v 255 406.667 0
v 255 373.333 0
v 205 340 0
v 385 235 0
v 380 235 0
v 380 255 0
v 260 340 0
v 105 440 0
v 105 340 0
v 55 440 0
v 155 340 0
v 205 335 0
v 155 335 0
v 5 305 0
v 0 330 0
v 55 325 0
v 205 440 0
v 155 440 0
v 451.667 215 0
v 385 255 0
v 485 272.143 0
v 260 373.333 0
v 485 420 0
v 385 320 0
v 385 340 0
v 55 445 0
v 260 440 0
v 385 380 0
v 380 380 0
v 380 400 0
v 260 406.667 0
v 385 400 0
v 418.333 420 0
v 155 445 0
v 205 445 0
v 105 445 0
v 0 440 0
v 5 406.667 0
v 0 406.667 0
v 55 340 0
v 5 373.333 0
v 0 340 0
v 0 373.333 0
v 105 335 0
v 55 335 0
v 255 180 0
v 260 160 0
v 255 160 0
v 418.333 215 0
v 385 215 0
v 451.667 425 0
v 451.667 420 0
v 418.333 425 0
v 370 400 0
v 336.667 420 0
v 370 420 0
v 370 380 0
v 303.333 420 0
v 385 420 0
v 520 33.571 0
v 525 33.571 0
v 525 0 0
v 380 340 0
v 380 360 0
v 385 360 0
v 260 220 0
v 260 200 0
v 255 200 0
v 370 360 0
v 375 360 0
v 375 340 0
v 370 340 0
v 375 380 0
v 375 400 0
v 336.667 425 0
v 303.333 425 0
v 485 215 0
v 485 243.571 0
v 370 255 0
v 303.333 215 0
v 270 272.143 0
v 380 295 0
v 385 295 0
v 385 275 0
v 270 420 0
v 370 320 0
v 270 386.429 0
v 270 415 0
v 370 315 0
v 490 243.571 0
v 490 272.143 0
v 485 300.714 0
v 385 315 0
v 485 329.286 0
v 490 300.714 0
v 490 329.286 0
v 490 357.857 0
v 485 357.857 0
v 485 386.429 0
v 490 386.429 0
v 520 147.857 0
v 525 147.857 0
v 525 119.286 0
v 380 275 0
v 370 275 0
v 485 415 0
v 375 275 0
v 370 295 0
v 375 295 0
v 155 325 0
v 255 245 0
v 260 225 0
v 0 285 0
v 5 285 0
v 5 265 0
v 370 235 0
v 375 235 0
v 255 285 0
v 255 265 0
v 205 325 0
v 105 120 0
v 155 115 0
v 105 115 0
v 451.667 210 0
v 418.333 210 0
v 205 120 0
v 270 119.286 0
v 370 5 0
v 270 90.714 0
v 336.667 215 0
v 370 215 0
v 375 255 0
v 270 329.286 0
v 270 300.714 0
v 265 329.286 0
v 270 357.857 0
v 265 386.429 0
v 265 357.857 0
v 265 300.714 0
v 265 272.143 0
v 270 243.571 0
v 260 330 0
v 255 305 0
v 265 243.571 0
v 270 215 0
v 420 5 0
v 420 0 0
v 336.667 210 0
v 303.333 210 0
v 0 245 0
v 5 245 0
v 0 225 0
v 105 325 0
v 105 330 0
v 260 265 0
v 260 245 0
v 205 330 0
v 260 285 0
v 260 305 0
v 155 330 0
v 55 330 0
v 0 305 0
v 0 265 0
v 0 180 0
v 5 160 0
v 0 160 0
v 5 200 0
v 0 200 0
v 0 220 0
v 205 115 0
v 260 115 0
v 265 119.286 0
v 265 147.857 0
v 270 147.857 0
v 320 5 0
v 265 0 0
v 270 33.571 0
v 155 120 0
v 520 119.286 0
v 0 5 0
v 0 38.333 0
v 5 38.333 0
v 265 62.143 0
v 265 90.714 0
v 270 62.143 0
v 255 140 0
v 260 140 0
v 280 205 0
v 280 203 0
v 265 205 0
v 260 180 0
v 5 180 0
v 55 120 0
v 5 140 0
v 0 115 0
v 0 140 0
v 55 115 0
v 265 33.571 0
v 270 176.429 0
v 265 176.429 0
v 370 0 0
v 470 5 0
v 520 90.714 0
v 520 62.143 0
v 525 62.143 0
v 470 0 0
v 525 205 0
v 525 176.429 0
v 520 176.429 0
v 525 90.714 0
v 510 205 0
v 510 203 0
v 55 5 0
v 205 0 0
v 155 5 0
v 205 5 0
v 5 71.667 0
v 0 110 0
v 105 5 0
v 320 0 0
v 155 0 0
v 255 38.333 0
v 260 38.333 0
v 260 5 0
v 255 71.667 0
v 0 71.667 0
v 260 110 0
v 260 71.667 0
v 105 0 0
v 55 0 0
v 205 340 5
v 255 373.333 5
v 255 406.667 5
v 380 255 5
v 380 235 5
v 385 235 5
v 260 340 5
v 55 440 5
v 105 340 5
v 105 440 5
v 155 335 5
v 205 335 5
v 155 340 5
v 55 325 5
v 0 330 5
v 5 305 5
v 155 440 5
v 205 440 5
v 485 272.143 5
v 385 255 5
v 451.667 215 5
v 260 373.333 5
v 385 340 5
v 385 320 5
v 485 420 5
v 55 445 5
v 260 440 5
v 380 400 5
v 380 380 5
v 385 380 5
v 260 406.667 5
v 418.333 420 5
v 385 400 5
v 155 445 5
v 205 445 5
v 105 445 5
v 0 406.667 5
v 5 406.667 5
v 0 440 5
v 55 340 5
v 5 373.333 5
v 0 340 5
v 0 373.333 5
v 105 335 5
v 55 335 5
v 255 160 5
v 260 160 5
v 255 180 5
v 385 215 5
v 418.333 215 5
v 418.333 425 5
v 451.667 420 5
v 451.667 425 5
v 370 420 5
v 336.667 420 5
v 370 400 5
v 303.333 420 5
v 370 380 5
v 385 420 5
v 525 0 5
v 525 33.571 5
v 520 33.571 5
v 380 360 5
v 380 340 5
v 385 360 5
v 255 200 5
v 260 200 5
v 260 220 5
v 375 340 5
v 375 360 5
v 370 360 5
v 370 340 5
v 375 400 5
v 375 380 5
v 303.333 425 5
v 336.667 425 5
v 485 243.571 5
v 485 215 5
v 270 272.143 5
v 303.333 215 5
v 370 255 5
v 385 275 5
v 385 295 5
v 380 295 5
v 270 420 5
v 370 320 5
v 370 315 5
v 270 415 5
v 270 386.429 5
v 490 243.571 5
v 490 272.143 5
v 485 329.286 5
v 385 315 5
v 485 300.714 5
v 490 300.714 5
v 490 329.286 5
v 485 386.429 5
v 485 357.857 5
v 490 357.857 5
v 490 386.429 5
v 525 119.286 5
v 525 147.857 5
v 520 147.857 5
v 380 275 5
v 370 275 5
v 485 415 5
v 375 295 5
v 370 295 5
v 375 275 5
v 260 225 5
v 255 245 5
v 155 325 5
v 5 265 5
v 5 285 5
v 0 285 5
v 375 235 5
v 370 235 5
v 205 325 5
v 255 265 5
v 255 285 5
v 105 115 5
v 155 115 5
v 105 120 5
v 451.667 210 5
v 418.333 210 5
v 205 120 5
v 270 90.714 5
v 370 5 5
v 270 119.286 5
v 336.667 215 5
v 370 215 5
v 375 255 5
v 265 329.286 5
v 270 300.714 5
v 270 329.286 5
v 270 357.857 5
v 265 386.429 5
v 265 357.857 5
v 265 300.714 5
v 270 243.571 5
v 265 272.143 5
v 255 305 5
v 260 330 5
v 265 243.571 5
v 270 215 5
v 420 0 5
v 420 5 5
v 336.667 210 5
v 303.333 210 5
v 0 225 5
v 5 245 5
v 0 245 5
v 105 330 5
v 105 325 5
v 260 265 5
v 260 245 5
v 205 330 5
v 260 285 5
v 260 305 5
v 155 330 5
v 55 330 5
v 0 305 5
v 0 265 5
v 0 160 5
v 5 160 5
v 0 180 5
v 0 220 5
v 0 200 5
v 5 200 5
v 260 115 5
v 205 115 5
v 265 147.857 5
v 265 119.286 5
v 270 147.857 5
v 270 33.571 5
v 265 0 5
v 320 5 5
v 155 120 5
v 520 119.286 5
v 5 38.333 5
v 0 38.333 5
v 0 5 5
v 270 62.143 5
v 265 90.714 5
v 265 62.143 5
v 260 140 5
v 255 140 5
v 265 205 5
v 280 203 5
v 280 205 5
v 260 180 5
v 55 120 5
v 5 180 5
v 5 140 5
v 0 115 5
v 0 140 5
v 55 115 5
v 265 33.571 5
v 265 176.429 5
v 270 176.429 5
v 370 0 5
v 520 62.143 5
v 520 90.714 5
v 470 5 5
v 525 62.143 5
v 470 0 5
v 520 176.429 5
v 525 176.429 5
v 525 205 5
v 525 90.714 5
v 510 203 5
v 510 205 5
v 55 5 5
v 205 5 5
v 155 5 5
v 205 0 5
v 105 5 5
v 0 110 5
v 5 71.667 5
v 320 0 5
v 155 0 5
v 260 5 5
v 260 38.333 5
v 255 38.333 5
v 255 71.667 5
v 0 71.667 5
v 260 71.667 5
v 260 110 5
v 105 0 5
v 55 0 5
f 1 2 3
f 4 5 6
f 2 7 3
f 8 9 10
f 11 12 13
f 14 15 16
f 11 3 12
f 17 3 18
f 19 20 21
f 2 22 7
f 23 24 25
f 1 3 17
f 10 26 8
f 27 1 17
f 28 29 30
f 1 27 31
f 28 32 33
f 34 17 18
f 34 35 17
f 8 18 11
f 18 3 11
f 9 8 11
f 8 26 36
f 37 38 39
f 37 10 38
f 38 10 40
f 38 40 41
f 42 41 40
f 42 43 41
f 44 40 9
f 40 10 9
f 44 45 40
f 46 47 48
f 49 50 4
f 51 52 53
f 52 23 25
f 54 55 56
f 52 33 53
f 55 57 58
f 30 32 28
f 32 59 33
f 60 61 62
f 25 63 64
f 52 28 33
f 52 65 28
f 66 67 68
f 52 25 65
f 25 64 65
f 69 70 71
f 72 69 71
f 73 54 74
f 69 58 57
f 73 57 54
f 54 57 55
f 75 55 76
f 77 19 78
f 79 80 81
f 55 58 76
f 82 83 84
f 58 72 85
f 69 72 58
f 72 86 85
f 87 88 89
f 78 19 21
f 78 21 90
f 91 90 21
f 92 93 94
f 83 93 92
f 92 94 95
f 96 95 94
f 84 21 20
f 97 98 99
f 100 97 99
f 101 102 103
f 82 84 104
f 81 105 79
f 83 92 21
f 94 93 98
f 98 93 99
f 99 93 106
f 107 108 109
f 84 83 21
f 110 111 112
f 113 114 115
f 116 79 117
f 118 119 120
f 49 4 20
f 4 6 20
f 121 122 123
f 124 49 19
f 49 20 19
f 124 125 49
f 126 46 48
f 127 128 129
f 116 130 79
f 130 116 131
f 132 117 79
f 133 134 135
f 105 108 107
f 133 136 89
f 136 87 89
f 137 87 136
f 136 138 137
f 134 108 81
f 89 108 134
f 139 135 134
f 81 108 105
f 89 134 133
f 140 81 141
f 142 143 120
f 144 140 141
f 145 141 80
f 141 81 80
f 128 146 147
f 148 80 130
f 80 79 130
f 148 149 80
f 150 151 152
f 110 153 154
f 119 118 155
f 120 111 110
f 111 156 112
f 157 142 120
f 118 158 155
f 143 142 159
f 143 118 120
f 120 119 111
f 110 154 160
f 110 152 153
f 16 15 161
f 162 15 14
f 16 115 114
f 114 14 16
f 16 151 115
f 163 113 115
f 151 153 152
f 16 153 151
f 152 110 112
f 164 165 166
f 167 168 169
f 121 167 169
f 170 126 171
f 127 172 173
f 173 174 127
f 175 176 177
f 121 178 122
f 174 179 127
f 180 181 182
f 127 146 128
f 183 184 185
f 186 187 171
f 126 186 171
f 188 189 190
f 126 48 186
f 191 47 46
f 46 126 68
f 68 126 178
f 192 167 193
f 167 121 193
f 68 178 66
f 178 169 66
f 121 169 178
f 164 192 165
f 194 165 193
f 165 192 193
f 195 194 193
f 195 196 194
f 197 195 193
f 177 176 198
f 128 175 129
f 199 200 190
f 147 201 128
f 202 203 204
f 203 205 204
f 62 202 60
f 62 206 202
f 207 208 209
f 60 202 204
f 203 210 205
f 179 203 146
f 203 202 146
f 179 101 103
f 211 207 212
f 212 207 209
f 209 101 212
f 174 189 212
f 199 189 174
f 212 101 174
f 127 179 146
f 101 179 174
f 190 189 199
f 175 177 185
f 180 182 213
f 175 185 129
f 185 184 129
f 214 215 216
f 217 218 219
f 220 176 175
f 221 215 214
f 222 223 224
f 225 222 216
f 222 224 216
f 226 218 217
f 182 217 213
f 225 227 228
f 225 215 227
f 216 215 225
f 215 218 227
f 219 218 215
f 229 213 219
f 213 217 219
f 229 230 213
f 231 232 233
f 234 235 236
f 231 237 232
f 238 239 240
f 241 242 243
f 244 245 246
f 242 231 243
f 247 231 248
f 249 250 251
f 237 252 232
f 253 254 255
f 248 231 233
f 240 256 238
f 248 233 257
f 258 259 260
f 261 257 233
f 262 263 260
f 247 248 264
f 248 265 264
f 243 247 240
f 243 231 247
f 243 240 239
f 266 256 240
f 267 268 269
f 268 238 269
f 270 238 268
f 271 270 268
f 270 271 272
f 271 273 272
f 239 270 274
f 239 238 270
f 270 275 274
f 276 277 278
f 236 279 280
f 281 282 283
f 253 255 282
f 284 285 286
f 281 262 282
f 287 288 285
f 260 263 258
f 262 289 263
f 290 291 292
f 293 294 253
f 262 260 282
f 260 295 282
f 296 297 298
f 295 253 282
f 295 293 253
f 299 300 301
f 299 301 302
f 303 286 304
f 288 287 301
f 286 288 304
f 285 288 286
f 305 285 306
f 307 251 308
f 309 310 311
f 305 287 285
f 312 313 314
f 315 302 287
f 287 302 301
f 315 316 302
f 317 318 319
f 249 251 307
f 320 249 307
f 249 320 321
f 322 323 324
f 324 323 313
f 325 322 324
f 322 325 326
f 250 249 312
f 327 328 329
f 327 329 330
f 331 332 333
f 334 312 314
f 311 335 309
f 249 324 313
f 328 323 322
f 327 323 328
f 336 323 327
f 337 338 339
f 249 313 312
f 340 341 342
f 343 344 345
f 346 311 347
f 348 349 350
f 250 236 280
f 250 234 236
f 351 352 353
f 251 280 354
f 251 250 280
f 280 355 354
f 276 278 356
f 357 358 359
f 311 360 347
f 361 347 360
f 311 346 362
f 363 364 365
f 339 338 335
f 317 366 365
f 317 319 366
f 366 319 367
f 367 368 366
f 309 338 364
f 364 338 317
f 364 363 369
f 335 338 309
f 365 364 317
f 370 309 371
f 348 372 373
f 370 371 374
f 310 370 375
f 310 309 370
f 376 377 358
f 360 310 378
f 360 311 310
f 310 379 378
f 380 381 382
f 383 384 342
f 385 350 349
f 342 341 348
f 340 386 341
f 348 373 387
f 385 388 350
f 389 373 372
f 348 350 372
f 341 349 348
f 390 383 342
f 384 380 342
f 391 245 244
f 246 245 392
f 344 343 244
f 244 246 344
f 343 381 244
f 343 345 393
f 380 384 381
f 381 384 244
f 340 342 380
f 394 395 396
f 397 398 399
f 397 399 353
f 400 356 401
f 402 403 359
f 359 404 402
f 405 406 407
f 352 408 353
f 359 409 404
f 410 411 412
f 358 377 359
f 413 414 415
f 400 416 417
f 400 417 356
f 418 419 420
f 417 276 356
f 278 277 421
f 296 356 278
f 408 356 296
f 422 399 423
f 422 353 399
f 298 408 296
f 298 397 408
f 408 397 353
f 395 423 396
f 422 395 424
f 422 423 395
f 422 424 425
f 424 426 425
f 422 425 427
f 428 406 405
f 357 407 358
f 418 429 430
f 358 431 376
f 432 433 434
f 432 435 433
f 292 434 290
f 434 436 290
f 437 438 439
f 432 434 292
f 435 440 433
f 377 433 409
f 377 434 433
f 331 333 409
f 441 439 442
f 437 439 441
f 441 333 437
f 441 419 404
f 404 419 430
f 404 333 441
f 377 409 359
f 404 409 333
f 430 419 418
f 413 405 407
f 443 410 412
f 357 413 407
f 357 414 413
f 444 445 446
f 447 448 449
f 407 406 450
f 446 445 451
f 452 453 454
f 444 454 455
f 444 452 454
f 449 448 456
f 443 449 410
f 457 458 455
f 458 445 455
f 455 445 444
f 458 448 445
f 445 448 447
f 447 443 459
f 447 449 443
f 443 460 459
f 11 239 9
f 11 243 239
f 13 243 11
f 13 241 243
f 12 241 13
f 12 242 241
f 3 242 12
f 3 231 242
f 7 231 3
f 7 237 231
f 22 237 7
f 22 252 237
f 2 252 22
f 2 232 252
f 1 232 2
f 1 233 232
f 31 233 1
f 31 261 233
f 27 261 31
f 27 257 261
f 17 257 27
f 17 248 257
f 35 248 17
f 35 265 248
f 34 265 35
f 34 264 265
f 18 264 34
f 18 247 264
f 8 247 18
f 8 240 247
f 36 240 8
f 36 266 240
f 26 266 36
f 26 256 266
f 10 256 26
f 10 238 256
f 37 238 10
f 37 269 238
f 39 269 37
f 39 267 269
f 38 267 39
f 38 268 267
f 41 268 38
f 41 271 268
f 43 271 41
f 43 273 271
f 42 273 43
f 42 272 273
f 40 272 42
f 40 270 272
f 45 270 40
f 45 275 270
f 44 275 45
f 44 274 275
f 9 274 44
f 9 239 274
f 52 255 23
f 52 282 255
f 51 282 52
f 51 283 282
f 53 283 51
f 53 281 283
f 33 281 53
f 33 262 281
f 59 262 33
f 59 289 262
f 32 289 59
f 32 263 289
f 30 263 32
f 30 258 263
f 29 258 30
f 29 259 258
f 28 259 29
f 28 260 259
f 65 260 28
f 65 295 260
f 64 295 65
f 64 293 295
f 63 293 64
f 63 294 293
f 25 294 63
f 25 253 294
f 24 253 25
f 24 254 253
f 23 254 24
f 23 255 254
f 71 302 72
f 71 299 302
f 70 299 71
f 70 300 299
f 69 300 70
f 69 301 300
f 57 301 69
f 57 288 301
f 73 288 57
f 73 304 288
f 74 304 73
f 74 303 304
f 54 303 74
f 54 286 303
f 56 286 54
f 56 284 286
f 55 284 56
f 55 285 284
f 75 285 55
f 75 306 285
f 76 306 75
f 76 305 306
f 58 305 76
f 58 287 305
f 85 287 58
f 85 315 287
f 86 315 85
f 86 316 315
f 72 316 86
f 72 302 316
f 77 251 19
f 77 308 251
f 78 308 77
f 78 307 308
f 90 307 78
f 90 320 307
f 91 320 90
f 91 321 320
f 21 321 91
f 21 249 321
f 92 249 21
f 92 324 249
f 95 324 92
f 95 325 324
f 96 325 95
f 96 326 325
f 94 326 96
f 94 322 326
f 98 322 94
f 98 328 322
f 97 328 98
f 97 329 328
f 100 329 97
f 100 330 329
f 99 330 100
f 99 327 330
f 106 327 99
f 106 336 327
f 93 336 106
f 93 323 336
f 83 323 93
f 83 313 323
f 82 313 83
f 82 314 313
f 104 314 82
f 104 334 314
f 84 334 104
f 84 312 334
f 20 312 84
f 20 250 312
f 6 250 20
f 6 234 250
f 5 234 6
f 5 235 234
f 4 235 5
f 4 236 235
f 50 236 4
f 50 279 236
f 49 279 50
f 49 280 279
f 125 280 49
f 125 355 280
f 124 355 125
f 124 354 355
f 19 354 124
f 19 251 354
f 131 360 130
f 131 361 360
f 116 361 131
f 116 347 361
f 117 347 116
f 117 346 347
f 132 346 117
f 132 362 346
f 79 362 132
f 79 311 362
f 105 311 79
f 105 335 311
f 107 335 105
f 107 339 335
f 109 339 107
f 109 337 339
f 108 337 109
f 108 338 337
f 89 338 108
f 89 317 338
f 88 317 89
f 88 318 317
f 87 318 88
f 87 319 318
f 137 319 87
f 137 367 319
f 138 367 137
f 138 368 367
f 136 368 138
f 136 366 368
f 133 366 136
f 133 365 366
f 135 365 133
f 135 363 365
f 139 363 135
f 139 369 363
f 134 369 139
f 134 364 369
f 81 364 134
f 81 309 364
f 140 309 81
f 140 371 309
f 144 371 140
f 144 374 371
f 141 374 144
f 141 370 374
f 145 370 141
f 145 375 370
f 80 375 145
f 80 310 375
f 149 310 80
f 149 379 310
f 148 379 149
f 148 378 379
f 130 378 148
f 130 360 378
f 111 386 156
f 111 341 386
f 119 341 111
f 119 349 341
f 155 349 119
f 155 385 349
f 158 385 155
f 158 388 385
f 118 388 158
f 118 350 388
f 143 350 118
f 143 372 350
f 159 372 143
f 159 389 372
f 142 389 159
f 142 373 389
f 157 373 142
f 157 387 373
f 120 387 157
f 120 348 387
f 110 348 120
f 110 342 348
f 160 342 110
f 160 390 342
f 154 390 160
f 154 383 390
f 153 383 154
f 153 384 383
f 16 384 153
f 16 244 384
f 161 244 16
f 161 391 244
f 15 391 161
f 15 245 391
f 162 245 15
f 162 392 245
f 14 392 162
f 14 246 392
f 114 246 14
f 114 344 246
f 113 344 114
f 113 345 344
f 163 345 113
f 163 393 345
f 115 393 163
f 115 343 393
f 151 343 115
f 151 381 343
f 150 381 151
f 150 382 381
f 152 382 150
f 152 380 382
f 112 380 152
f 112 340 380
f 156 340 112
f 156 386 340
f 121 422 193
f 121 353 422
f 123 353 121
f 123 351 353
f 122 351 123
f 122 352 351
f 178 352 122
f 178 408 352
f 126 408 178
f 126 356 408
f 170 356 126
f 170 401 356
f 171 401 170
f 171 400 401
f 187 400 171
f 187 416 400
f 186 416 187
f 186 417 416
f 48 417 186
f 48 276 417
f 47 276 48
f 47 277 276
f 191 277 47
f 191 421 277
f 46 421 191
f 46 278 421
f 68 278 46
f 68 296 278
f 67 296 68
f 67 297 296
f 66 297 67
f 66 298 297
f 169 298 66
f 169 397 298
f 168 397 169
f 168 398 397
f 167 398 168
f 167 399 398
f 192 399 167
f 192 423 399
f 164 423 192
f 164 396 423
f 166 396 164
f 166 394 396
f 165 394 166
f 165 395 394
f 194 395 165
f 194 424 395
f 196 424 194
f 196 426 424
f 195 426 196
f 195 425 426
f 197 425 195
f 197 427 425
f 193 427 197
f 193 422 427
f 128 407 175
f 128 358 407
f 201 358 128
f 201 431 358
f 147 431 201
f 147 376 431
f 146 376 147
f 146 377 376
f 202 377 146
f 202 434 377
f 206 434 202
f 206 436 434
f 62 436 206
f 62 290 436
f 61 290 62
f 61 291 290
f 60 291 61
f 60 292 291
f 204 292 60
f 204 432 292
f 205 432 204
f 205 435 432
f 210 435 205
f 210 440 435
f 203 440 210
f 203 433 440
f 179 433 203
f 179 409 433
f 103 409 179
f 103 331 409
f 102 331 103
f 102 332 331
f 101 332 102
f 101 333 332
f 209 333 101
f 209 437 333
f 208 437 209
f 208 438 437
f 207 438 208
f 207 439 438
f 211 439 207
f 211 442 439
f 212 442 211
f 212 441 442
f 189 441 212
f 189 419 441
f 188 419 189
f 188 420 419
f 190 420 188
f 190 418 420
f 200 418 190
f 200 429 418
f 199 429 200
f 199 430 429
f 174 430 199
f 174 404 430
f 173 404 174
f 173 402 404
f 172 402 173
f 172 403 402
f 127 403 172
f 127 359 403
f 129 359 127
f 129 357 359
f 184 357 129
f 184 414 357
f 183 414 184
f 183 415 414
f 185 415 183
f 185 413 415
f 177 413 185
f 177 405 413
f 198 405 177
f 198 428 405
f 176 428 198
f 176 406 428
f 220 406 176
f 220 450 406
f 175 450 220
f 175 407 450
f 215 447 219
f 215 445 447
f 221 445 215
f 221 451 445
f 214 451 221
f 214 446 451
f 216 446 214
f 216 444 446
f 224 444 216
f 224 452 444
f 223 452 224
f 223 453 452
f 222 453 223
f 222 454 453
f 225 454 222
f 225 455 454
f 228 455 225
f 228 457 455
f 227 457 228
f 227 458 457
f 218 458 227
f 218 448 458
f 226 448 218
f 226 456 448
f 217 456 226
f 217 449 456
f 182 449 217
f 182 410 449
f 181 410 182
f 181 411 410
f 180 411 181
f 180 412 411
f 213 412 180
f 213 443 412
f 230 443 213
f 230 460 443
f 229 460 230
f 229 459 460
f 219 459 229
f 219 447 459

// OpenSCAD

//Customizable Box 
//By Iron Momo


/* [Basic] */
box_width = 250;
box_height = 200;
box_depth = 100;
material_thickness = 5; //[3,5,10]

output_type = "STL"; //[DXF,STL]

/* [Advanced] */
spacing = 5; //[1,5,10]
ratio = 0.5; //[0.25,0.5]


/* [Hidden] */
h2 = box_height*ratio; //Height of the upper part
h1 = box_height*(1-ratio); //Height of the lower part

// preview[view: north, tilt:top]


if(output_type=="STL")
{linear_extrude(height = material_thickness, center = false) box_creation();
}

if(output_type=="DXF")
{box_creation();}



/*--------------*/
/* BOX CREATION */
/*--------------*/
module box_creation()
{
	top();
	translate([0,spacing+box_depth+2*material_thickness]) front_1();
	translate([0,2*spacing+box_depth+h1+3*material_thickness]) front_2();
	translate([0,3*spacing+4*material_thickness+box_depth+h1+h2,0]) bottom();
	translate([box_width+2*material_thickness+spacing,0,0])rear();
	translate([box_width+2*material_thickness+spacing,material_thickness+box_height+spacing,0]) sides();
}

/*----------------*/
/* Top of the box */
/*----------------*/
module top()
{

//Basic shape
translate([material_thickness,material_thickness,0]) square([box_width,box_depth]); 

//Notches
translate([0,material_thickness+box_depth,0]) square([box_width+2*material_thickness,material_thickness]);

translate([0,material_thickness,0]) square([material_thickness,box_depth/3]);
translate([0,material_thickness+2*box_depth/3,0]) square([material_thickness,box_depth/3]);

translate([material_thickness+box_width,material_thickness,0]) square([material_thickness,box_depth/3]);
translate([material_thickness+box_width,material_thickness+2*box_depth/3,0]) square([material_thickness,box_depth/3]);

translate([material_thickness+box_width/5,0,0]) square([box_width/5,material_thickness]);
translate([material_thickness+3*box_width/5,0,0]) square([box_width/5,material_thickness]);


}


/*--------------------*/
/* 2 sides of the box */
/*--------------------*/
module sides()
{
//1st side, upper and lower part
side_1();
translate ([material_thickness,h1+spacing+material_thickness,0]) side_2();

//2nd side is just a mirrored one
translate([2*box_depth+4*material_thickness+spacing,0,0])
{
	mirror ([1,0,0])
		{
		side_1();
		translate ([material_thickness,h1+spacing+material_thickness,0]) side_2();
		}
	}
}
/*------------------*/
/* Side: Upper part */
/*------------------*/
module side_2()
{

//Basic shape
polygon(points=[[0,h2],[box_depth,h2],[box_depth,0]], paths=[[0,1,2]]);

//Notches
translate([box_depth,h2/5,0]) square([material_thickness,h2/5]);
translate([box_depth,3*h2/5,0]) square([material_thickness,h2/5]);

translate([box_depth/3,h2,0]) square([box_depth/3,material_thickness]);
}

/*------------------*/
/* Side: Lower part */
/*------------------*/
module side_1()
{

//Basic shape
translate([material_thickness,material_thickness,0])
	{
	square([box_depth,h1]);
	polygon(points=[[0,box_height],[0,h1],[box_depth,h1]], paths=[[0,1,2]]);
	}

//Notches
translate([material_thickness+box_depth/3,0,0]) square([box_depth/3,material_thickness]);

translate([0,material_thickness+box_height/7,0]) square([material_thickness,box_height/7]);
translate([0,material_thickness+3*box_height/7,0]) square([material_thickness,box_height/7]);
translate([0,material_thickness+5*box_height/7,0]) square([material_thickness,box_height/7]);

translate([material_thickness+box_depth,material_thickness+h1/5,0]) square([material_thickness,h1/5]);
translate([material_thickness+box_depth,material_thickness+3*h1/5,0]) square([material_thickness,h1/5]);
}




/*-------------------------*/
/* Front plate: Upper part */
/*-------------------------*/
module front_2()
{

//Basic shape
translate([material_thickness,0,0]) square([box_width,h2]);

//Notches
translate([0,h2,0]) square([box_width/5+material_thickness,material_thickness]);
translate([material_thickness+2*box_width/5,h2,0]) square([box_width/5,material_thickness]);
translate([material_thickness+4*box_width/5,h2,0]) square([material_thickness+box_width/5,material_thickness]);

square([material_thickness,h2/5]);
translate([0,2*h2/5,0]) square([material_thickness,h2/5]);
translate([0,4*h2/5,0]) square([material_thickness,h2/5]);
	
translate([material_thickness+box_width,0,0]) square([material_thickness,h2/5]);
translate([material_thickness+box_width,2*h2/5,0]) square([material_thickness,h2/5]);
translate([material_thickness+box_width,4*h2/5,0]) square([material_thickness,h2/5]);
}


/*-------------------------*/
/* Front plate: Lower part */
/*-------------------------*/
module front_1()
{

//Basic shape
translate([material_thickness,material_thickness,0]) square([box_width,h1]);
	
//Notches
square([box_width/5+material_thickness,material_thickness]);
translate([material_thickness+2*box_width/5,0,0]) square([box_width/5,material_thickness]);
translate([material_thickness+4*box_width/5,0,0]) square([material_thickness+box_width/5,material_thickness]);

translate([0,material_thickness,0]) square([material_thickness,h1/5]);
translate([0,material_thickness+2*h1/5,0]) square([material_thickness,h1/5]);
translate([0,material_thickness+4*h1/5,0]) square([material_thickness,h1/5]);

translate([material_thickness+box_width,material_thickness,0]) square([material_thickness,h1/5]);
translate([material_thickness+box_width,material_thickness+2*h1/5,0]) square([material_thickness,h1/5]);
translate([material_thickness+box_width,material_thickness+4*h1/5,0]) square([material_thickness,h1/5]);
}


/*------------*/
/* Back plate */
/*------------*/
module rear()
{

//Basic shape
translate([material_thickness,material_thickness,0]) 
	{
	difference()
		{
		square([box_width,box_height]);
		translate([10,box_height-2,0]) square([box_width-20,2]);
		}
	}

square([box_width/5+material_thickness,material_thickness]);

//Notches
translate([material_thickness+2*box_width/5,0,0]) square([box_width/5,material_thickness]);
translate([material_thickness+4*box_width/5,0,0]) square([box_width/5+material_thickness,material_thickness]);
	
translate([0,material_thickness,0]) square([material_thickness,box_height/7]);
translate([0,material_thickness+2*box_height/7,0]) square([material_thickness,box_height/7]);
translate([0,material_thickness+4*box_height/7,0]) square([material_thickness,box_height/7]);
translate([0,material_thickness+6*box_height/7,0]) square([material_thickness,box_height/7]);

translate([material_thickness+box_width,material_thickness,0]) square([material_thickness,box_height/7]);
translate([material_thickness+box_width,material_thickness+2*box_height/7,0]) square([material_thickness,box_height/7]);
translate([material_thickness+box_width,material_thickness+4*box_height/7,0]) square([material_thickness,box_height/7]);
translate([material_thickness+box_width,material_thickness+6*box_height/7,0]) square([material_thickness,box_height/7]);
}

/*--------------*/
/* Bottom plate */
/*--------------*/
module bottom()
{

//Basic shape
translate([material_thickness,material_thickness,0]) square([box_width,box_depth]);

//Notches
translate([material_thickness+box_width/5,0,0]) square([box_width/5,material_thickness]);
translate([material_thickness+3*box_width/5,0,0]) square([box_width/5,material_thickness]);
translate([material_thickness+box_width/5,material_thickness+box_depth,0]) square([box_width/5,material_thickness]);
translate([material_thickness+3*box_width/5,material_thickness+box_depth,0]) square([box_width/5,material_thickness]);

translate([0,material_thickness,0]) square([material_thickness,box_depth/3]);
translate([0,material_thickness+2*box_depth/3,0]) square([material_thickness,box_depth/3]);
translate([material_thickness+box_width,material_thickness,0]) square([material_thickness,box_depth/3]);
translate([material_thickness+box_width,material_thickness+2*box_depth/3,0]) square([material_thickness,box_depth/3]);
}
